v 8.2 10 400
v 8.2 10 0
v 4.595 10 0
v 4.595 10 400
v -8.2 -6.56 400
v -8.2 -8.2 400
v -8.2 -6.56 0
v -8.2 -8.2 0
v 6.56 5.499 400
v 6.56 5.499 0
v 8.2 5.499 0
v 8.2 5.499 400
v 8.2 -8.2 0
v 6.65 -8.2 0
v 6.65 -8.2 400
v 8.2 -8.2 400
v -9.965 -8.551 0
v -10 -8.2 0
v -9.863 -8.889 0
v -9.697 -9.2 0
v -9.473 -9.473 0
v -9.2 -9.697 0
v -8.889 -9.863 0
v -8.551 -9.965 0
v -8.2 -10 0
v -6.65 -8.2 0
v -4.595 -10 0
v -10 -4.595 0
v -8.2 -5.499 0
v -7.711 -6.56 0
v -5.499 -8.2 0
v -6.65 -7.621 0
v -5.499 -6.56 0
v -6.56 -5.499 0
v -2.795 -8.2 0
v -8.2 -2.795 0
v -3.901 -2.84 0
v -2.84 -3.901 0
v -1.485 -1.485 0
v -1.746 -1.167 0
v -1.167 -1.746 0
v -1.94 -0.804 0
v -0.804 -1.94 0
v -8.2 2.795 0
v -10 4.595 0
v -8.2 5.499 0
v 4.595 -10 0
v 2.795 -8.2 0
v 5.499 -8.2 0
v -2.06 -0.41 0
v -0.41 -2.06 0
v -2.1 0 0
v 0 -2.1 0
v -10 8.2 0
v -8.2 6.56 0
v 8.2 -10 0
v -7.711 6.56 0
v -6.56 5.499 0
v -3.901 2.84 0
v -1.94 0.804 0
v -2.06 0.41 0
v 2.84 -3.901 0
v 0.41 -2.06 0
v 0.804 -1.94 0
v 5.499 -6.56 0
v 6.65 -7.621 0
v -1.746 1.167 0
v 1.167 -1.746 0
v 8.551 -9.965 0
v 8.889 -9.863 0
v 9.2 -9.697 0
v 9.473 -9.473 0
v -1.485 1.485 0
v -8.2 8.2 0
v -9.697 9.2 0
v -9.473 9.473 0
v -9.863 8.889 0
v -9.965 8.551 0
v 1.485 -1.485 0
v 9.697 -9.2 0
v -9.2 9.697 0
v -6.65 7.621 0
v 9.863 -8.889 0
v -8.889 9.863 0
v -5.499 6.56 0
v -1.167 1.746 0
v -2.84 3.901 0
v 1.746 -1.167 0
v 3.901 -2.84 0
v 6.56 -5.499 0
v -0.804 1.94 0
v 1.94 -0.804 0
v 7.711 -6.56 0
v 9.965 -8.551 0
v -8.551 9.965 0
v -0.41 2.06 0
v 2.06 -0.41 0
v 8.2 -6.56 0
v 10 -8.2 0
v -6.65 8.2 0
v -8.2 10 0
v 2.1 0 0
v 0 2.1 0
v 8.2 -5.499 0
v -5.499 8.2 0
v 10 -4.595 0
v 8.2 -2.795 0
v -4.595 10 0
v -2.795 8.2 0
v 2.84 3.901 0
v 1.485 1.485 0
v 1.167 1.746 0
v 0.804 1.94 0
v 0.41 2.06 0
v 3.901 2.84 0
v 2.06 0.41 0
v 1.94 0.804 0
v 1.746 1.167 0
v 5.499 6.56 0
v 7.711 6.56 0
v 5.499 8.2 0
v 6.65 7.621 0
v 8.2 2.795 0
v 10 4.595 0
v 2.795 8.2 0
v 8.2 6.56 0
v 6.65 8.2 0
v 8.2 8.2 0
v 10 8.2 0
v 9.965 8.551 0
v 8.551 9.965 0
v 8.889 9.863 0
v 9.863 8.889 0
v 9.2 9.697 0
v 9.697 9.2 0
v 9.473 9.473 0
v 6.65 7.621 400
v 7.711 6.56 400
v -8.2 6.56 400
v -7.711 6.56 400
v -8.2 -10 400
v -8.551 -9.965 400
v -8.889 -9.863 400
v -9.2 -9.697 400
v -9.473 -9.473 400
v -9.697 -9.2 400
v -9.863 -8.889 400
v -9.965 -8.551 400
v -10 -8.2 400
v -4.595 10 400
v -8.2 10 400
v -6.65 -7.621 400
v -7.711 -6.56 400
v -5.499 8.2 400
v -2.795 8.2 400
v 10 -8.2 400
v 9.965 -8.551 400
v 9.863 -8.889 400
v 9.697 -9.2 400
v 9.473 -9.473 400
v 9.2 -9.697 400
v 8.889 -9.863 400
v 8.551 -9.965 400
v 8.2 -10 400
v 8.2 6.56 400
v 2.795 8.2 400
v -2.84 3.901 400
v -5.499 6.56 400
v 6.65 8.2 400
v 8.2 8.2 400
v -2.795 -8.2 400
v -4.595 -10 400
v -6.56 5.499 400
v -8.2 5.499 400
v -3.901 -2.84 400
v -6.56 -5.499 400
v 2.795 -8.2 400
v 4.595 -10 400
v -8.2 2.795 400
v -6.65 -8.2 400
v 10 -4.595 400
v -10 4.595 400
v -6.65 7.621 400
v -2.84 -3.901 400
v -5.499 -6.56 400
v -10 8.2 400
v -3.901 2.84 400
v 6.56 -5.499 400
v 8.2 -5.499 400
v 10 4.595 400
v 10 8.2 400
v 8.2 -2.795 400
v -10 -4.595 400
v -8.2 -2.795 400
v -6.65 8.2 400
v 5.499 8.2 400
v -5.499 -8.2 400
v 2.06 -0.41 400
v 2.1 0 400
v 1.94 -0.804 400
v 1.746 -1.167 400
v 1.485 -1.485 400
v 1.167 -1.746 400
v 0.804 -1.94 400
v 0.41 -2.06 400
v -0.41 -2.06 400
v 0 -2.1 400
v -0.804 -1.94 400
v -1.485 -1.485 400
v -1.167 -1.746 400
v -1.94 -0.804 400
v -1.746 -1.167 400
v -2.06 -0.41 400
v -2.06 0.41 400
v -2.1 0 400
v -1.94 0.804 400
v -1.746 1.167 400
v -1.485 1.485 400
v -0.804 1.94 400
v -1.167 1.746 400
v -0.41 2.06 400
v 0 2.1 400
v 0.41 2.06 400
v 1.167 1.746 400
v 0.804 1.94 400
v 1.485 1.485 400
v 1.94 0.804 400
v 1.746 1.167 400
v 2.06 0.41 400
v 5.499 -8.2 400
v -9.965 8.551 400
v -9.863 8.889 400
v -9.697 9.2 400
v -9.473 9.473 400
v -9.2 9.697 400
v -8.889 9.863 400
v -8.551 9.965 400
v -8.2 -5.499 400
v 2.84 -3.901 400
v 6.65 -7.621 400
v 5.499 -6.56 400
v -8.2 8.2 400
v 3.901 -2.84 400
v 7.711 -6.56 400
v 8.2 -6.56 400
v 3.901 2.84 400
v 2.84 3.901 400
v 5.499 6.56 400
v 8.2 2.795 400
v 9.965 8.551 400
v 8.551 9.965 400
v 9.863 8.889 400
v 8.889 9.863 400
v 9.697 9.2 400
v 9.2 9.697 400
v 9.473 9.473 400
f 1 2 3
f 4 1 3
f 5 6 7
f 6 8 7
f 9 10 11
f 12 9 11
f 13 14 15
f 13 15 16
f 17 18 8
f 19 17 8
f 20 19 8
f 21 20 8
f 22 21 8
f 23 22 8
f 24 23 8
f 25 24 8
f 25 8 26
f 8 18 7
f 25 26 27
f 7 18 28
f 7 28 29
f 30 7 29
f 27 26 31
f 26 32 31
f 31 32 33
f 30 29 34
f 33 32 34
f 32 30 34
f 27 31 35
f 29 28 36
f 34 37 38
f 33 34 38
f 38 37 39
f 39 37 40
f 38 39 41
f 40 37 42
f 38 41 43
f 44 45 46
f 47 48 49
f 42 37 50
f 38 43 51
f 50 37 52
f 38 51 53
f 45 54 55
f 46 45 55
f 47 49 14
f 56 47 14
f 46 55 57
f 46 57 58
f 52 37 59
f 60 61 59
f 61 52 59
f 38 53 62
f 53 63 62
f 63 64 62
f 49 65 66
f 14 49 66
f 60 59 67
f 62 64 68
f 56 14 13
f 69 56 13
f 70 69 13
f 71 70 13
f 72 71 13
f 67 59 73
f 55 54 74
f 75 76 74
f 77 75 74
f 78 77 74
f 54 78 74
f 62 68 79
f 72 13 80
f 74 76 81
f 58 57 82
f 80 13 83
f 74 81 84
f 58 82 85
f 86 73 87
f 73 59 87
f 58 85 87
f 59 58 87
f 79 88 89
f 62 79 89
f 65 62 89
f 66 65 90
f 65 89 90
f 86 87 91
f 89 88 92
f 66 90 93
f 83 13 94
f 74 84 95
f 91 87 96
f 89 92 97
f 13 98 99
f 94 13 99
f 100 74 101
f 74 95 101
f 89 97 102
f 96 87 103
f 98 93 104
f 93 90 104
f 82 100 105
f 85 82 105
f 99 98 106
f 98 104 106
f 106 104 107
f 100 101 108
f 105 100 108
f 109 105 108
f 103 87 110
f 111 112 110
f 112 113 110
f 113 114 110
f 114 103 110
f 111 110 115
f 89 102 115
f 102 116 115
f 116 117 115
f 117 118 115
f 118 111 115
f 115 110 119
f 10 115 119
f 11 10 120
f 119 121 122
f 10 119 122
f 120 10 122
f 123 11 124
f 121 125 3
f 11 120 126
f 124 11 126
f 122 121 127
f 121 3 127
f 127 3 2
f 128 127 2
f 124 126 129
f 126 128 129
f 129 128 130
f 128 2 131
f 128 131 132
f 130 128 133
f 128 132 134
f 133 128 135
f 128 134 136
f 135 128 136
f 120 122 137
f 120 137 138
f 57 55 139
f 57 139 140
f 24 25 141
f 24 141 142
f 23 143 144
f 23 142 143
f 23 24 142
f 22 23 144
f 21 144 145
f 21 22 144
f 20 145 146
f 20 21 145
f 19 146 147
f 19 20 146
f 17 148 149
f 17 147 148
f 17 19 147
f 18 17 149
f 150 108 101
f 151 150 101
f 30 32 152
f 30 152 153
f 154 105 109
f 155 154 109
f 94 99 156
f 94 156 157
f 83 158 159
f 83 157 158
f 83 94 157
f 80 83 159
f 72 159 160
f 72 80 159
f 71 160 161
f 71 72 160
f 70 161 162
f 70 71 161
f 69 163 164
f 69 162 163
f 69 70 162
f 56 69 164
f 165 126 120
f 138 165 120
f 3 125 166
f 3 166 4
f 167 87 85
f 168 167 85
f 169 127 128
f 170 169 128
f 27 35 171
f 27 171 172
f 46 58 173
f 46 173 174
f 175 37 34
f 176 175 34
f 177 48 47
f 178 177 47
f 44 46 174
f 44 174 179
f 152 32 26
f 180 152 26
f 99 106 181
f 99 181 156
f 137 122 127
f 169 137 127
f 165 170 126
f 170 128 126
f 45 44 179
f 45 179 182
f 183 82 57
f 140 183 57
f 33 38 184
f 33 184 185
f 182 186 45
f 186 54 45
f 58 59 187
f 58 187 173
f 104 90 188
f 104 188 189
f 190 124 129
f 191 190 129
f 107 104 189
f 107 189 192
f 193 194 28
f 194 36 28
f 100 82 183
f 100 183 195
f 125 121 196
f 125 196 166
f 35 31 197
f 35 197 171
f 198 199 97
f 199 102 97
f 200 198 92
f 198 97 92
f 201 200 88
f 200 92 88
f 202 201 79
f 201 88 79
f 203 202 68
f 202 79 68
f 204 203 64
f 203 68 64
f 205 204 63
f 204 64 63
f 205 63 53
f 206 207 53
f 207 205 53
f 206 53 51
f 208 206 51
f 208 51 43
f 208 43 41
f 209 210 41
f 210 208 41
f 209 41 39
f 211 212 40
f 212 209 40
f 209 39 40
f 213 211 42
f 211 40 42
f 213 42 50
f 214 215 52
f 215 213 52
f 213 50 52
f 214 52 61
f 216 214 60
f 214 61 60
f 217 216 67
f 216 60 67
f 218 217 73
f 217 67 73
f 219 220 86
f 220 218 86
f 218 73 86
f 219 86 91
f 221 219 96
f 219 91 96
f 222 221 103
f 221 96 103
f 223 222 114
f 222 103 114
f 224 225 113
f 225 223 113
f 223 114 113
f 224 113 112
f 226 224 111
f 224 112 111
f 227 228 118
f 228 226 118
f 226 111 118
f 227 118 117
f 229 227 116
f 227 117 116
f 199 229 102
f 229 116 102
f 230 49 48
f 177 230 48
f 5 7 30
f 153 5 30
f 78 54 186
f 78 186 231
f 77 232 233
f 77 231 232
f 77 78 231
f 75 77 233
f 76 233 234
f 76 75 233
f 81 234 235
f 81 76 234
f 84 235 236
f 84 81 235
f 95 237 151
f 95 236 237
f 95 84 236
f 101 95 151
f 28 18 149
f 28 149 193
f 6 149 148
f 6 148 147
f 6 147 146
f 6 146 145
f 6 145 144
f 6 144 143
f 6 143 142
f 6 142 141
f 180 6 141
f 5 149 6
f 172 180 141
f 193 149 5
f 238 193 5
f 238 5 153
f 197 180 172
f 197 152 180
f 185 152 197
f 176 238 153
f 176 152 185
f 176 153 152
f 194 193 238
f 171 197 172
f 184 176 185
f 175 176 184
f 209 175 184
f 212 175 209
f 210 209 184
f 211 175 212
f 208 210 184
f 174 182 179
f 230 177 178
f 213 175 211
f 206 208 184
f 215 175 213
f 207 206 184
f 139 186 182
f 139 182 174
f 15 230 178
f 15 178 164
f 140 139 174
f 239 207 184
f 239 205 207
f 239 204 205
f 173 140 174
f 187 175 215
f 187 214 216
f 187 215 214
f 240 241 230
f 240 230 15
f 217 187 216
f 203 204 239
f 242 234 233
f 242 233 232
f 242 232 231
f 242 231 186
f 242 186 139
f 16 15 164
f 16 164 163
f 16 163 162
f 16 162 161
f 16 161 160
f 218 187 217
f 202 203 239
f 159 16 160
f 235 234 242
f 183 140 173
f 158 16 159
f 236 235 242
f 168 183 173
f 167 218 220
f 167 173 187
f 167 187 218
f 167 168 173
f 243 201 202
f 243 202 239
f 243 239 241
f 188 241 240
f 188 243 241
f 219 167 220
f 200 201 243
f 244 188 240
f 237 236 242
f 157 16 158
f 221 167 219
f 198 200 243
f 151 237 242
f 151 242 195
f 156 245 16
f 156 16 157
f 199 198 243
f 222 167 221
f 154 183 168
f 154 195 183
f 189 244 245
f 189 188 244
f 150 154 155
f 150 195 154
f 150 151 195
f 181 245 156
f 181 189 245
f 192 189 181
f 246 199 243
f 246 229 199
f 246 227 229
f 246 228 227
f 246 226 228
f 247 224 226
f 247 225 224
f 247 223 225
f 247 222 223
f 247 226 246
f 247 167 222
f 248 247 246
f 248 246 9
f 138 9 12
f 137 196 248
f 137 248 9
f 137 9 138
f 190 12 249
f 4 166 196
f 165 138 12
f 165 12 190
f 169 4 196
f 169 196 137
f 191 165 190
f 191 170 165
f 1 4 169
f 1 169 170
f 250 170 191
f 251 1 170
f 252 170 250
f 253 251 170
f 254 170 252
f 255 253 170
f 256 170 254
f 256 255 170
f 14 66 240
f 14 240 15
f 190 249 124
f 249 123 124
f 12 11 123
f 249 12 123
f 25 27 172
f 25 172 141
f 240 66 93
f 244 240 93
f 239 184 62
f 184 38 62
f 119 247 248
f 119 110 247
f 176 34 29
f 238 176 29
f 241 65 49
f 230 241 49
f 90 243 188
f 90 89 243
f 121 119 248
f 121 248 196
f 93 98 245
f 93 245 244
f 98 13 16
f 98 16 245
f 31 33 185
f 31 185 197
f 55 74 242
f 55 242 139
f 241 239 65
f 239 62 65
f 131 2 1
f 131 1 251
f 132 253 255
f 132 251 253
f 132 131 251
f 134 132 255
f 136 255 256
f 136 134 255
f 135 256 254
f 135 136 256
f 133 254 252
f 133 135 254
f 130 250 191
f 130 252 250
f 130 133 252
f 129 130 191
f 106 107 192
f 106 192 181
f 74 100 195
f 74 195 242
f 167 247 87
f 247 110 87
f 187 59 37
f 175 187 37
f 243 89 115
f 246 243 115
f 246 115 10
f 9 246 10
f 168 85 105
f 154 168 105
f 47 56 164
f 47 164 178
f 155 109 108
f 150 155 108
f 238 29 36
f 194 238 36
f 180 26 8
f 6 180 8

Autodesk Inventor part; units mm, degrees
ref_plane "YZ Plane" through (0, 0, 0) normal (1, 0, 0) x (0, 1, 0)
ref_plane "Start Plane" through (0, 0, 0) normal (0, 0, 1) x (1, 0, 0)
ref_plane "End Plane" through (0, 0, 400) normal (0, 0, 1) x (1, 0, 0)
sketch "Sketch1" plane through (0, 0, 0) normal (0, 0, 1) x (1, 0, 0)
  line L0 (10, -4.5951) -> (10, -8.2)
  line L1 (-10, -8.2) -> (-10, -4.5951)
  line L2 (-10, 10) -> (10, -10) construction
  line L3 (10, 10) -> (-10, -10) construction
  circle A0 centre (0, 0) radius 2.1
  line L4 (-2.84, -3.9007) -> (2.84, -3.9007)
  line L5 (3.9007, -2.84) -> (3.9007, 2.84)
  line L6 (2.84, 3.9007) -> (-2.84, 3.9007)
  line L7 (-3.9007, 2.84) -> (-3.9007, -2.84)
  line L8 (-3.9007, -3.9007) -> (3.9007, 3.9007) construction
  line L9 (3.9007, -3.9007) -> (-3.9007, 3.9007) construction
  line L10 (-3.9007, -2.84) -> (-2.84, -3.9007) construction
  line L11 (-2.84, -3.9007) -> (-5.4993, -6.56)
  line L12 (-5.4993, -6.56) -> (-5.4993, -8.2)
  line L13 (-5.4993, -8.2) -> (-2.7951, -8.2)
  line L14 (-2.7951, -8.2) -> (-4.5951, -10)
  line L15 (0, 0) -> (0, -3.9007) construction
  line L16 (3.9007, -2.84) -> (2.84, -3.9007) construction
  line L17 (2.84, -3.9007) -> (5.4993, -6.56)
  line L18 (5.4993, -6.56) -> (5.4993, -8.2)
  line L19 (5.4993, -8.2) -> (2.7951, -8.2)
  line L20 (2.7951, -8.2) -> (4.5951, -10)
  line L21 (-2.84, -3.9007) -> (-3.9007, -2.84) construction
  line L22 (-3.9007, -2.84) -> (-6.56, -5.4993)
  line L23 (-6.56, -5.4993) -> (-8.2, -5.4993)
  line L24 (-8.2, -5.4993) -> (-8.2, -2.7951)
  line L25 (-8.2, -2.7951) -> (-10, -4.5951)
  line L26 (3.9007, -2.84) -> (6.56, -5.4993)
  line L27 (6.56, -5.4993) -> (8.2, -5.4993)
  line L28 (8.2, -5.4993) -> (8.2, -2.7951)
  line L29 (8.2, -2.7951) -> (10, -4.5951)
  arc A1 (-10, -8.2) -> (-8.2, -10) centre (-8.2, -8.2) ccw
  arc A2 (8.2, -10) -> (10, -8.2) centre (8.2, -8.2) ccw
  line L30 (-8.2, -6.56) -> (-7.7111, -6.56)
  line L31 (-6.6505, -8.2) -> (-8.2, -8.2)
  line L32 (-8.2, -8.2) -> (-8.2, -6.56)
  line L33 (-6.6505, -7.6207) -> (-7.7111, -6.56)
  line L34 (-6.6505, -7.6207) -> (-6.6505, -8.2)
  line L35 (8.2, -6.56) -> (7.7111, -6.56)
  line L36 (6.6505, -8.2) -> (8.2, -8.2)
  line L37 (8.2, -8.2) -> (8.2, -6.56)
  line L38 (6.6505, -7.6207) -> (7.7111, -6.56)
  line L39 (6.6505, -7.6207) -> (6.6505, -8.2)
  line L40 (8.2, -10) -> (4.5951, -10)
  line L41 (-4.5951, -10) -> (-8.2, -10)
  line L42 (-3.9007, 0) -> (3.9007, 0) construction
  line L43 (10, 4.5951) -> (10, 8.2)
  line L44 (-10, 8.2) -> (-10, 4.5951)
  line L45 (-2.84, 3.9007) -> (2.84, 3.9007)
  line L46 (-3.9007, 2.84) -> (-2.84, 3.9007) construction
  line L47 (-2.84, 3.9007) -> (-5.4993, 6.56)
  line L48 (-5.4993, 6.56) -> (-5.4993, 8.2)
  line L49 (-5.4993, 8.2) -> (-2.7951, 8.2)
  line L50 (-2.7951, 8.2) -> (-4.5951, 10)
  line L51 (2.84, 3.9007) -> (5.4993, 6.56)
  line L52 (5.4993, 6.56) -> (5.4993, 8.2)
  line L53 (5.4993, 8.2) -> (2.7951, 8.2)
  line L54 (2.7951, 8.2) -> (4.5951, 10)
  line L55 (3.9007, 2.84) -> (2.84, 3.9007) construction
  line L56 (-8.2, 2.7951) -> (-10, 4.5951)
  line L57 (-2.84, 3.9007) -> (-3.9007, 2.84) construction
  line L58 (-3.9007, 2.84) -> (-6.56, 5.4993)
  line L59 (-6.56, 5.4993) -> (-8.2, 5.4993)
  line L60 (-8.2, 5.4993) -> (-8.2, 2.7951)
  line L61 (3.9007, 2.84) -> (6.56, 5.4993)
  line L62 (6.56, 5.4993) -> (8.2, 5.4993)
  line L63 (8.2, 5.4993) -> (8.2, 2.7951)
  line L64 (8.2, 2.7951) -> (10, 4.5951)
  arc A3 (-8.2, 10) -> (-10, 8.2) centre (-8.2, 8.2) ccw
  arc A4 (10, 8.2) -> (8.2, 10) centre (8.2, 8.2) ccw
  line L65 (-8.2, 6.56) -> (-7.7111, 6.56)
  line L66 (-6.6505, 8.2) -> (-8.2, 8.2)
  line L67 (-8.2, 8.2) -> (-8.2, 6.56)
  line L68 (-6.6505, 7.6207) -> (-7.7111, 6.56)
  line L69 (-6.6505, 7.6207) -> (-6.6505, 8.2)
  line L70 (8.2, 6.56) -> (7.7111, 6.56)
  line L71 (6.6505, 7.6207) -> (7.7111, 6.56)
  line L72 (8.2, 8.2) -> (8.2, 6.56)
  line L73 (6.6505, 7.6207) -> (6.6505, 8.2)
  line L74 (6.6505, 8.2) -> (8.2, 8.2)
  line L75 (8.2, 10) -> (4.5951, 10)
  line L76 (-4.5951, 10) -> (-8.2, 10)
  line L77 (-8.2, 10) -> (-4.5951, 10)
  line L78 (4.5951, 10) -> (8.2, 10)
  point P0 (8.2, -8.2)
  point P1 (0, 3.9007)
  point P2 (8.2, 8.2)
  dimension "Width" = 20
  dimension "Height" = 20
  dimension "d2" = 4.2
  dimension "d3" = 1.5
  dimension "d4" = 1.64
  dimension "d6" = 5.68
  dimension "d7" = 1.8
  dimension "d9" = 1.5
extrude "Body" add sketch "Sketch1" along normal up to surface (400 mm away) from surface at 0
sketch "Sketch4" plane through (0, 0, 0) normal (0, 0, 1) x (1, 0, 0)
  line L0 (0, 0) -> (10, 0)
ref_plane "Work Plane4" through (0, 0, 0) normal (0, -1, 0) x (1, 0, 0)
sketch "Sketch5" plane through (0, 0, 0) normal (0, -1, 0) x (1, 0, 0)
  line L0 (-2, 0) -> (12, 0) construction
  line L1 (-2, 400) -> (12, 400) construction
  dimension "d17" = 400
equation "\"G_OFFSET_START\" = 0"
equation "\"G_OFFSET_END\" = 0"
equation "\"G_L\" = d17"
properties part number "400 mm V-Slot 20mm x 20mm" material "Aluminum 6061"
